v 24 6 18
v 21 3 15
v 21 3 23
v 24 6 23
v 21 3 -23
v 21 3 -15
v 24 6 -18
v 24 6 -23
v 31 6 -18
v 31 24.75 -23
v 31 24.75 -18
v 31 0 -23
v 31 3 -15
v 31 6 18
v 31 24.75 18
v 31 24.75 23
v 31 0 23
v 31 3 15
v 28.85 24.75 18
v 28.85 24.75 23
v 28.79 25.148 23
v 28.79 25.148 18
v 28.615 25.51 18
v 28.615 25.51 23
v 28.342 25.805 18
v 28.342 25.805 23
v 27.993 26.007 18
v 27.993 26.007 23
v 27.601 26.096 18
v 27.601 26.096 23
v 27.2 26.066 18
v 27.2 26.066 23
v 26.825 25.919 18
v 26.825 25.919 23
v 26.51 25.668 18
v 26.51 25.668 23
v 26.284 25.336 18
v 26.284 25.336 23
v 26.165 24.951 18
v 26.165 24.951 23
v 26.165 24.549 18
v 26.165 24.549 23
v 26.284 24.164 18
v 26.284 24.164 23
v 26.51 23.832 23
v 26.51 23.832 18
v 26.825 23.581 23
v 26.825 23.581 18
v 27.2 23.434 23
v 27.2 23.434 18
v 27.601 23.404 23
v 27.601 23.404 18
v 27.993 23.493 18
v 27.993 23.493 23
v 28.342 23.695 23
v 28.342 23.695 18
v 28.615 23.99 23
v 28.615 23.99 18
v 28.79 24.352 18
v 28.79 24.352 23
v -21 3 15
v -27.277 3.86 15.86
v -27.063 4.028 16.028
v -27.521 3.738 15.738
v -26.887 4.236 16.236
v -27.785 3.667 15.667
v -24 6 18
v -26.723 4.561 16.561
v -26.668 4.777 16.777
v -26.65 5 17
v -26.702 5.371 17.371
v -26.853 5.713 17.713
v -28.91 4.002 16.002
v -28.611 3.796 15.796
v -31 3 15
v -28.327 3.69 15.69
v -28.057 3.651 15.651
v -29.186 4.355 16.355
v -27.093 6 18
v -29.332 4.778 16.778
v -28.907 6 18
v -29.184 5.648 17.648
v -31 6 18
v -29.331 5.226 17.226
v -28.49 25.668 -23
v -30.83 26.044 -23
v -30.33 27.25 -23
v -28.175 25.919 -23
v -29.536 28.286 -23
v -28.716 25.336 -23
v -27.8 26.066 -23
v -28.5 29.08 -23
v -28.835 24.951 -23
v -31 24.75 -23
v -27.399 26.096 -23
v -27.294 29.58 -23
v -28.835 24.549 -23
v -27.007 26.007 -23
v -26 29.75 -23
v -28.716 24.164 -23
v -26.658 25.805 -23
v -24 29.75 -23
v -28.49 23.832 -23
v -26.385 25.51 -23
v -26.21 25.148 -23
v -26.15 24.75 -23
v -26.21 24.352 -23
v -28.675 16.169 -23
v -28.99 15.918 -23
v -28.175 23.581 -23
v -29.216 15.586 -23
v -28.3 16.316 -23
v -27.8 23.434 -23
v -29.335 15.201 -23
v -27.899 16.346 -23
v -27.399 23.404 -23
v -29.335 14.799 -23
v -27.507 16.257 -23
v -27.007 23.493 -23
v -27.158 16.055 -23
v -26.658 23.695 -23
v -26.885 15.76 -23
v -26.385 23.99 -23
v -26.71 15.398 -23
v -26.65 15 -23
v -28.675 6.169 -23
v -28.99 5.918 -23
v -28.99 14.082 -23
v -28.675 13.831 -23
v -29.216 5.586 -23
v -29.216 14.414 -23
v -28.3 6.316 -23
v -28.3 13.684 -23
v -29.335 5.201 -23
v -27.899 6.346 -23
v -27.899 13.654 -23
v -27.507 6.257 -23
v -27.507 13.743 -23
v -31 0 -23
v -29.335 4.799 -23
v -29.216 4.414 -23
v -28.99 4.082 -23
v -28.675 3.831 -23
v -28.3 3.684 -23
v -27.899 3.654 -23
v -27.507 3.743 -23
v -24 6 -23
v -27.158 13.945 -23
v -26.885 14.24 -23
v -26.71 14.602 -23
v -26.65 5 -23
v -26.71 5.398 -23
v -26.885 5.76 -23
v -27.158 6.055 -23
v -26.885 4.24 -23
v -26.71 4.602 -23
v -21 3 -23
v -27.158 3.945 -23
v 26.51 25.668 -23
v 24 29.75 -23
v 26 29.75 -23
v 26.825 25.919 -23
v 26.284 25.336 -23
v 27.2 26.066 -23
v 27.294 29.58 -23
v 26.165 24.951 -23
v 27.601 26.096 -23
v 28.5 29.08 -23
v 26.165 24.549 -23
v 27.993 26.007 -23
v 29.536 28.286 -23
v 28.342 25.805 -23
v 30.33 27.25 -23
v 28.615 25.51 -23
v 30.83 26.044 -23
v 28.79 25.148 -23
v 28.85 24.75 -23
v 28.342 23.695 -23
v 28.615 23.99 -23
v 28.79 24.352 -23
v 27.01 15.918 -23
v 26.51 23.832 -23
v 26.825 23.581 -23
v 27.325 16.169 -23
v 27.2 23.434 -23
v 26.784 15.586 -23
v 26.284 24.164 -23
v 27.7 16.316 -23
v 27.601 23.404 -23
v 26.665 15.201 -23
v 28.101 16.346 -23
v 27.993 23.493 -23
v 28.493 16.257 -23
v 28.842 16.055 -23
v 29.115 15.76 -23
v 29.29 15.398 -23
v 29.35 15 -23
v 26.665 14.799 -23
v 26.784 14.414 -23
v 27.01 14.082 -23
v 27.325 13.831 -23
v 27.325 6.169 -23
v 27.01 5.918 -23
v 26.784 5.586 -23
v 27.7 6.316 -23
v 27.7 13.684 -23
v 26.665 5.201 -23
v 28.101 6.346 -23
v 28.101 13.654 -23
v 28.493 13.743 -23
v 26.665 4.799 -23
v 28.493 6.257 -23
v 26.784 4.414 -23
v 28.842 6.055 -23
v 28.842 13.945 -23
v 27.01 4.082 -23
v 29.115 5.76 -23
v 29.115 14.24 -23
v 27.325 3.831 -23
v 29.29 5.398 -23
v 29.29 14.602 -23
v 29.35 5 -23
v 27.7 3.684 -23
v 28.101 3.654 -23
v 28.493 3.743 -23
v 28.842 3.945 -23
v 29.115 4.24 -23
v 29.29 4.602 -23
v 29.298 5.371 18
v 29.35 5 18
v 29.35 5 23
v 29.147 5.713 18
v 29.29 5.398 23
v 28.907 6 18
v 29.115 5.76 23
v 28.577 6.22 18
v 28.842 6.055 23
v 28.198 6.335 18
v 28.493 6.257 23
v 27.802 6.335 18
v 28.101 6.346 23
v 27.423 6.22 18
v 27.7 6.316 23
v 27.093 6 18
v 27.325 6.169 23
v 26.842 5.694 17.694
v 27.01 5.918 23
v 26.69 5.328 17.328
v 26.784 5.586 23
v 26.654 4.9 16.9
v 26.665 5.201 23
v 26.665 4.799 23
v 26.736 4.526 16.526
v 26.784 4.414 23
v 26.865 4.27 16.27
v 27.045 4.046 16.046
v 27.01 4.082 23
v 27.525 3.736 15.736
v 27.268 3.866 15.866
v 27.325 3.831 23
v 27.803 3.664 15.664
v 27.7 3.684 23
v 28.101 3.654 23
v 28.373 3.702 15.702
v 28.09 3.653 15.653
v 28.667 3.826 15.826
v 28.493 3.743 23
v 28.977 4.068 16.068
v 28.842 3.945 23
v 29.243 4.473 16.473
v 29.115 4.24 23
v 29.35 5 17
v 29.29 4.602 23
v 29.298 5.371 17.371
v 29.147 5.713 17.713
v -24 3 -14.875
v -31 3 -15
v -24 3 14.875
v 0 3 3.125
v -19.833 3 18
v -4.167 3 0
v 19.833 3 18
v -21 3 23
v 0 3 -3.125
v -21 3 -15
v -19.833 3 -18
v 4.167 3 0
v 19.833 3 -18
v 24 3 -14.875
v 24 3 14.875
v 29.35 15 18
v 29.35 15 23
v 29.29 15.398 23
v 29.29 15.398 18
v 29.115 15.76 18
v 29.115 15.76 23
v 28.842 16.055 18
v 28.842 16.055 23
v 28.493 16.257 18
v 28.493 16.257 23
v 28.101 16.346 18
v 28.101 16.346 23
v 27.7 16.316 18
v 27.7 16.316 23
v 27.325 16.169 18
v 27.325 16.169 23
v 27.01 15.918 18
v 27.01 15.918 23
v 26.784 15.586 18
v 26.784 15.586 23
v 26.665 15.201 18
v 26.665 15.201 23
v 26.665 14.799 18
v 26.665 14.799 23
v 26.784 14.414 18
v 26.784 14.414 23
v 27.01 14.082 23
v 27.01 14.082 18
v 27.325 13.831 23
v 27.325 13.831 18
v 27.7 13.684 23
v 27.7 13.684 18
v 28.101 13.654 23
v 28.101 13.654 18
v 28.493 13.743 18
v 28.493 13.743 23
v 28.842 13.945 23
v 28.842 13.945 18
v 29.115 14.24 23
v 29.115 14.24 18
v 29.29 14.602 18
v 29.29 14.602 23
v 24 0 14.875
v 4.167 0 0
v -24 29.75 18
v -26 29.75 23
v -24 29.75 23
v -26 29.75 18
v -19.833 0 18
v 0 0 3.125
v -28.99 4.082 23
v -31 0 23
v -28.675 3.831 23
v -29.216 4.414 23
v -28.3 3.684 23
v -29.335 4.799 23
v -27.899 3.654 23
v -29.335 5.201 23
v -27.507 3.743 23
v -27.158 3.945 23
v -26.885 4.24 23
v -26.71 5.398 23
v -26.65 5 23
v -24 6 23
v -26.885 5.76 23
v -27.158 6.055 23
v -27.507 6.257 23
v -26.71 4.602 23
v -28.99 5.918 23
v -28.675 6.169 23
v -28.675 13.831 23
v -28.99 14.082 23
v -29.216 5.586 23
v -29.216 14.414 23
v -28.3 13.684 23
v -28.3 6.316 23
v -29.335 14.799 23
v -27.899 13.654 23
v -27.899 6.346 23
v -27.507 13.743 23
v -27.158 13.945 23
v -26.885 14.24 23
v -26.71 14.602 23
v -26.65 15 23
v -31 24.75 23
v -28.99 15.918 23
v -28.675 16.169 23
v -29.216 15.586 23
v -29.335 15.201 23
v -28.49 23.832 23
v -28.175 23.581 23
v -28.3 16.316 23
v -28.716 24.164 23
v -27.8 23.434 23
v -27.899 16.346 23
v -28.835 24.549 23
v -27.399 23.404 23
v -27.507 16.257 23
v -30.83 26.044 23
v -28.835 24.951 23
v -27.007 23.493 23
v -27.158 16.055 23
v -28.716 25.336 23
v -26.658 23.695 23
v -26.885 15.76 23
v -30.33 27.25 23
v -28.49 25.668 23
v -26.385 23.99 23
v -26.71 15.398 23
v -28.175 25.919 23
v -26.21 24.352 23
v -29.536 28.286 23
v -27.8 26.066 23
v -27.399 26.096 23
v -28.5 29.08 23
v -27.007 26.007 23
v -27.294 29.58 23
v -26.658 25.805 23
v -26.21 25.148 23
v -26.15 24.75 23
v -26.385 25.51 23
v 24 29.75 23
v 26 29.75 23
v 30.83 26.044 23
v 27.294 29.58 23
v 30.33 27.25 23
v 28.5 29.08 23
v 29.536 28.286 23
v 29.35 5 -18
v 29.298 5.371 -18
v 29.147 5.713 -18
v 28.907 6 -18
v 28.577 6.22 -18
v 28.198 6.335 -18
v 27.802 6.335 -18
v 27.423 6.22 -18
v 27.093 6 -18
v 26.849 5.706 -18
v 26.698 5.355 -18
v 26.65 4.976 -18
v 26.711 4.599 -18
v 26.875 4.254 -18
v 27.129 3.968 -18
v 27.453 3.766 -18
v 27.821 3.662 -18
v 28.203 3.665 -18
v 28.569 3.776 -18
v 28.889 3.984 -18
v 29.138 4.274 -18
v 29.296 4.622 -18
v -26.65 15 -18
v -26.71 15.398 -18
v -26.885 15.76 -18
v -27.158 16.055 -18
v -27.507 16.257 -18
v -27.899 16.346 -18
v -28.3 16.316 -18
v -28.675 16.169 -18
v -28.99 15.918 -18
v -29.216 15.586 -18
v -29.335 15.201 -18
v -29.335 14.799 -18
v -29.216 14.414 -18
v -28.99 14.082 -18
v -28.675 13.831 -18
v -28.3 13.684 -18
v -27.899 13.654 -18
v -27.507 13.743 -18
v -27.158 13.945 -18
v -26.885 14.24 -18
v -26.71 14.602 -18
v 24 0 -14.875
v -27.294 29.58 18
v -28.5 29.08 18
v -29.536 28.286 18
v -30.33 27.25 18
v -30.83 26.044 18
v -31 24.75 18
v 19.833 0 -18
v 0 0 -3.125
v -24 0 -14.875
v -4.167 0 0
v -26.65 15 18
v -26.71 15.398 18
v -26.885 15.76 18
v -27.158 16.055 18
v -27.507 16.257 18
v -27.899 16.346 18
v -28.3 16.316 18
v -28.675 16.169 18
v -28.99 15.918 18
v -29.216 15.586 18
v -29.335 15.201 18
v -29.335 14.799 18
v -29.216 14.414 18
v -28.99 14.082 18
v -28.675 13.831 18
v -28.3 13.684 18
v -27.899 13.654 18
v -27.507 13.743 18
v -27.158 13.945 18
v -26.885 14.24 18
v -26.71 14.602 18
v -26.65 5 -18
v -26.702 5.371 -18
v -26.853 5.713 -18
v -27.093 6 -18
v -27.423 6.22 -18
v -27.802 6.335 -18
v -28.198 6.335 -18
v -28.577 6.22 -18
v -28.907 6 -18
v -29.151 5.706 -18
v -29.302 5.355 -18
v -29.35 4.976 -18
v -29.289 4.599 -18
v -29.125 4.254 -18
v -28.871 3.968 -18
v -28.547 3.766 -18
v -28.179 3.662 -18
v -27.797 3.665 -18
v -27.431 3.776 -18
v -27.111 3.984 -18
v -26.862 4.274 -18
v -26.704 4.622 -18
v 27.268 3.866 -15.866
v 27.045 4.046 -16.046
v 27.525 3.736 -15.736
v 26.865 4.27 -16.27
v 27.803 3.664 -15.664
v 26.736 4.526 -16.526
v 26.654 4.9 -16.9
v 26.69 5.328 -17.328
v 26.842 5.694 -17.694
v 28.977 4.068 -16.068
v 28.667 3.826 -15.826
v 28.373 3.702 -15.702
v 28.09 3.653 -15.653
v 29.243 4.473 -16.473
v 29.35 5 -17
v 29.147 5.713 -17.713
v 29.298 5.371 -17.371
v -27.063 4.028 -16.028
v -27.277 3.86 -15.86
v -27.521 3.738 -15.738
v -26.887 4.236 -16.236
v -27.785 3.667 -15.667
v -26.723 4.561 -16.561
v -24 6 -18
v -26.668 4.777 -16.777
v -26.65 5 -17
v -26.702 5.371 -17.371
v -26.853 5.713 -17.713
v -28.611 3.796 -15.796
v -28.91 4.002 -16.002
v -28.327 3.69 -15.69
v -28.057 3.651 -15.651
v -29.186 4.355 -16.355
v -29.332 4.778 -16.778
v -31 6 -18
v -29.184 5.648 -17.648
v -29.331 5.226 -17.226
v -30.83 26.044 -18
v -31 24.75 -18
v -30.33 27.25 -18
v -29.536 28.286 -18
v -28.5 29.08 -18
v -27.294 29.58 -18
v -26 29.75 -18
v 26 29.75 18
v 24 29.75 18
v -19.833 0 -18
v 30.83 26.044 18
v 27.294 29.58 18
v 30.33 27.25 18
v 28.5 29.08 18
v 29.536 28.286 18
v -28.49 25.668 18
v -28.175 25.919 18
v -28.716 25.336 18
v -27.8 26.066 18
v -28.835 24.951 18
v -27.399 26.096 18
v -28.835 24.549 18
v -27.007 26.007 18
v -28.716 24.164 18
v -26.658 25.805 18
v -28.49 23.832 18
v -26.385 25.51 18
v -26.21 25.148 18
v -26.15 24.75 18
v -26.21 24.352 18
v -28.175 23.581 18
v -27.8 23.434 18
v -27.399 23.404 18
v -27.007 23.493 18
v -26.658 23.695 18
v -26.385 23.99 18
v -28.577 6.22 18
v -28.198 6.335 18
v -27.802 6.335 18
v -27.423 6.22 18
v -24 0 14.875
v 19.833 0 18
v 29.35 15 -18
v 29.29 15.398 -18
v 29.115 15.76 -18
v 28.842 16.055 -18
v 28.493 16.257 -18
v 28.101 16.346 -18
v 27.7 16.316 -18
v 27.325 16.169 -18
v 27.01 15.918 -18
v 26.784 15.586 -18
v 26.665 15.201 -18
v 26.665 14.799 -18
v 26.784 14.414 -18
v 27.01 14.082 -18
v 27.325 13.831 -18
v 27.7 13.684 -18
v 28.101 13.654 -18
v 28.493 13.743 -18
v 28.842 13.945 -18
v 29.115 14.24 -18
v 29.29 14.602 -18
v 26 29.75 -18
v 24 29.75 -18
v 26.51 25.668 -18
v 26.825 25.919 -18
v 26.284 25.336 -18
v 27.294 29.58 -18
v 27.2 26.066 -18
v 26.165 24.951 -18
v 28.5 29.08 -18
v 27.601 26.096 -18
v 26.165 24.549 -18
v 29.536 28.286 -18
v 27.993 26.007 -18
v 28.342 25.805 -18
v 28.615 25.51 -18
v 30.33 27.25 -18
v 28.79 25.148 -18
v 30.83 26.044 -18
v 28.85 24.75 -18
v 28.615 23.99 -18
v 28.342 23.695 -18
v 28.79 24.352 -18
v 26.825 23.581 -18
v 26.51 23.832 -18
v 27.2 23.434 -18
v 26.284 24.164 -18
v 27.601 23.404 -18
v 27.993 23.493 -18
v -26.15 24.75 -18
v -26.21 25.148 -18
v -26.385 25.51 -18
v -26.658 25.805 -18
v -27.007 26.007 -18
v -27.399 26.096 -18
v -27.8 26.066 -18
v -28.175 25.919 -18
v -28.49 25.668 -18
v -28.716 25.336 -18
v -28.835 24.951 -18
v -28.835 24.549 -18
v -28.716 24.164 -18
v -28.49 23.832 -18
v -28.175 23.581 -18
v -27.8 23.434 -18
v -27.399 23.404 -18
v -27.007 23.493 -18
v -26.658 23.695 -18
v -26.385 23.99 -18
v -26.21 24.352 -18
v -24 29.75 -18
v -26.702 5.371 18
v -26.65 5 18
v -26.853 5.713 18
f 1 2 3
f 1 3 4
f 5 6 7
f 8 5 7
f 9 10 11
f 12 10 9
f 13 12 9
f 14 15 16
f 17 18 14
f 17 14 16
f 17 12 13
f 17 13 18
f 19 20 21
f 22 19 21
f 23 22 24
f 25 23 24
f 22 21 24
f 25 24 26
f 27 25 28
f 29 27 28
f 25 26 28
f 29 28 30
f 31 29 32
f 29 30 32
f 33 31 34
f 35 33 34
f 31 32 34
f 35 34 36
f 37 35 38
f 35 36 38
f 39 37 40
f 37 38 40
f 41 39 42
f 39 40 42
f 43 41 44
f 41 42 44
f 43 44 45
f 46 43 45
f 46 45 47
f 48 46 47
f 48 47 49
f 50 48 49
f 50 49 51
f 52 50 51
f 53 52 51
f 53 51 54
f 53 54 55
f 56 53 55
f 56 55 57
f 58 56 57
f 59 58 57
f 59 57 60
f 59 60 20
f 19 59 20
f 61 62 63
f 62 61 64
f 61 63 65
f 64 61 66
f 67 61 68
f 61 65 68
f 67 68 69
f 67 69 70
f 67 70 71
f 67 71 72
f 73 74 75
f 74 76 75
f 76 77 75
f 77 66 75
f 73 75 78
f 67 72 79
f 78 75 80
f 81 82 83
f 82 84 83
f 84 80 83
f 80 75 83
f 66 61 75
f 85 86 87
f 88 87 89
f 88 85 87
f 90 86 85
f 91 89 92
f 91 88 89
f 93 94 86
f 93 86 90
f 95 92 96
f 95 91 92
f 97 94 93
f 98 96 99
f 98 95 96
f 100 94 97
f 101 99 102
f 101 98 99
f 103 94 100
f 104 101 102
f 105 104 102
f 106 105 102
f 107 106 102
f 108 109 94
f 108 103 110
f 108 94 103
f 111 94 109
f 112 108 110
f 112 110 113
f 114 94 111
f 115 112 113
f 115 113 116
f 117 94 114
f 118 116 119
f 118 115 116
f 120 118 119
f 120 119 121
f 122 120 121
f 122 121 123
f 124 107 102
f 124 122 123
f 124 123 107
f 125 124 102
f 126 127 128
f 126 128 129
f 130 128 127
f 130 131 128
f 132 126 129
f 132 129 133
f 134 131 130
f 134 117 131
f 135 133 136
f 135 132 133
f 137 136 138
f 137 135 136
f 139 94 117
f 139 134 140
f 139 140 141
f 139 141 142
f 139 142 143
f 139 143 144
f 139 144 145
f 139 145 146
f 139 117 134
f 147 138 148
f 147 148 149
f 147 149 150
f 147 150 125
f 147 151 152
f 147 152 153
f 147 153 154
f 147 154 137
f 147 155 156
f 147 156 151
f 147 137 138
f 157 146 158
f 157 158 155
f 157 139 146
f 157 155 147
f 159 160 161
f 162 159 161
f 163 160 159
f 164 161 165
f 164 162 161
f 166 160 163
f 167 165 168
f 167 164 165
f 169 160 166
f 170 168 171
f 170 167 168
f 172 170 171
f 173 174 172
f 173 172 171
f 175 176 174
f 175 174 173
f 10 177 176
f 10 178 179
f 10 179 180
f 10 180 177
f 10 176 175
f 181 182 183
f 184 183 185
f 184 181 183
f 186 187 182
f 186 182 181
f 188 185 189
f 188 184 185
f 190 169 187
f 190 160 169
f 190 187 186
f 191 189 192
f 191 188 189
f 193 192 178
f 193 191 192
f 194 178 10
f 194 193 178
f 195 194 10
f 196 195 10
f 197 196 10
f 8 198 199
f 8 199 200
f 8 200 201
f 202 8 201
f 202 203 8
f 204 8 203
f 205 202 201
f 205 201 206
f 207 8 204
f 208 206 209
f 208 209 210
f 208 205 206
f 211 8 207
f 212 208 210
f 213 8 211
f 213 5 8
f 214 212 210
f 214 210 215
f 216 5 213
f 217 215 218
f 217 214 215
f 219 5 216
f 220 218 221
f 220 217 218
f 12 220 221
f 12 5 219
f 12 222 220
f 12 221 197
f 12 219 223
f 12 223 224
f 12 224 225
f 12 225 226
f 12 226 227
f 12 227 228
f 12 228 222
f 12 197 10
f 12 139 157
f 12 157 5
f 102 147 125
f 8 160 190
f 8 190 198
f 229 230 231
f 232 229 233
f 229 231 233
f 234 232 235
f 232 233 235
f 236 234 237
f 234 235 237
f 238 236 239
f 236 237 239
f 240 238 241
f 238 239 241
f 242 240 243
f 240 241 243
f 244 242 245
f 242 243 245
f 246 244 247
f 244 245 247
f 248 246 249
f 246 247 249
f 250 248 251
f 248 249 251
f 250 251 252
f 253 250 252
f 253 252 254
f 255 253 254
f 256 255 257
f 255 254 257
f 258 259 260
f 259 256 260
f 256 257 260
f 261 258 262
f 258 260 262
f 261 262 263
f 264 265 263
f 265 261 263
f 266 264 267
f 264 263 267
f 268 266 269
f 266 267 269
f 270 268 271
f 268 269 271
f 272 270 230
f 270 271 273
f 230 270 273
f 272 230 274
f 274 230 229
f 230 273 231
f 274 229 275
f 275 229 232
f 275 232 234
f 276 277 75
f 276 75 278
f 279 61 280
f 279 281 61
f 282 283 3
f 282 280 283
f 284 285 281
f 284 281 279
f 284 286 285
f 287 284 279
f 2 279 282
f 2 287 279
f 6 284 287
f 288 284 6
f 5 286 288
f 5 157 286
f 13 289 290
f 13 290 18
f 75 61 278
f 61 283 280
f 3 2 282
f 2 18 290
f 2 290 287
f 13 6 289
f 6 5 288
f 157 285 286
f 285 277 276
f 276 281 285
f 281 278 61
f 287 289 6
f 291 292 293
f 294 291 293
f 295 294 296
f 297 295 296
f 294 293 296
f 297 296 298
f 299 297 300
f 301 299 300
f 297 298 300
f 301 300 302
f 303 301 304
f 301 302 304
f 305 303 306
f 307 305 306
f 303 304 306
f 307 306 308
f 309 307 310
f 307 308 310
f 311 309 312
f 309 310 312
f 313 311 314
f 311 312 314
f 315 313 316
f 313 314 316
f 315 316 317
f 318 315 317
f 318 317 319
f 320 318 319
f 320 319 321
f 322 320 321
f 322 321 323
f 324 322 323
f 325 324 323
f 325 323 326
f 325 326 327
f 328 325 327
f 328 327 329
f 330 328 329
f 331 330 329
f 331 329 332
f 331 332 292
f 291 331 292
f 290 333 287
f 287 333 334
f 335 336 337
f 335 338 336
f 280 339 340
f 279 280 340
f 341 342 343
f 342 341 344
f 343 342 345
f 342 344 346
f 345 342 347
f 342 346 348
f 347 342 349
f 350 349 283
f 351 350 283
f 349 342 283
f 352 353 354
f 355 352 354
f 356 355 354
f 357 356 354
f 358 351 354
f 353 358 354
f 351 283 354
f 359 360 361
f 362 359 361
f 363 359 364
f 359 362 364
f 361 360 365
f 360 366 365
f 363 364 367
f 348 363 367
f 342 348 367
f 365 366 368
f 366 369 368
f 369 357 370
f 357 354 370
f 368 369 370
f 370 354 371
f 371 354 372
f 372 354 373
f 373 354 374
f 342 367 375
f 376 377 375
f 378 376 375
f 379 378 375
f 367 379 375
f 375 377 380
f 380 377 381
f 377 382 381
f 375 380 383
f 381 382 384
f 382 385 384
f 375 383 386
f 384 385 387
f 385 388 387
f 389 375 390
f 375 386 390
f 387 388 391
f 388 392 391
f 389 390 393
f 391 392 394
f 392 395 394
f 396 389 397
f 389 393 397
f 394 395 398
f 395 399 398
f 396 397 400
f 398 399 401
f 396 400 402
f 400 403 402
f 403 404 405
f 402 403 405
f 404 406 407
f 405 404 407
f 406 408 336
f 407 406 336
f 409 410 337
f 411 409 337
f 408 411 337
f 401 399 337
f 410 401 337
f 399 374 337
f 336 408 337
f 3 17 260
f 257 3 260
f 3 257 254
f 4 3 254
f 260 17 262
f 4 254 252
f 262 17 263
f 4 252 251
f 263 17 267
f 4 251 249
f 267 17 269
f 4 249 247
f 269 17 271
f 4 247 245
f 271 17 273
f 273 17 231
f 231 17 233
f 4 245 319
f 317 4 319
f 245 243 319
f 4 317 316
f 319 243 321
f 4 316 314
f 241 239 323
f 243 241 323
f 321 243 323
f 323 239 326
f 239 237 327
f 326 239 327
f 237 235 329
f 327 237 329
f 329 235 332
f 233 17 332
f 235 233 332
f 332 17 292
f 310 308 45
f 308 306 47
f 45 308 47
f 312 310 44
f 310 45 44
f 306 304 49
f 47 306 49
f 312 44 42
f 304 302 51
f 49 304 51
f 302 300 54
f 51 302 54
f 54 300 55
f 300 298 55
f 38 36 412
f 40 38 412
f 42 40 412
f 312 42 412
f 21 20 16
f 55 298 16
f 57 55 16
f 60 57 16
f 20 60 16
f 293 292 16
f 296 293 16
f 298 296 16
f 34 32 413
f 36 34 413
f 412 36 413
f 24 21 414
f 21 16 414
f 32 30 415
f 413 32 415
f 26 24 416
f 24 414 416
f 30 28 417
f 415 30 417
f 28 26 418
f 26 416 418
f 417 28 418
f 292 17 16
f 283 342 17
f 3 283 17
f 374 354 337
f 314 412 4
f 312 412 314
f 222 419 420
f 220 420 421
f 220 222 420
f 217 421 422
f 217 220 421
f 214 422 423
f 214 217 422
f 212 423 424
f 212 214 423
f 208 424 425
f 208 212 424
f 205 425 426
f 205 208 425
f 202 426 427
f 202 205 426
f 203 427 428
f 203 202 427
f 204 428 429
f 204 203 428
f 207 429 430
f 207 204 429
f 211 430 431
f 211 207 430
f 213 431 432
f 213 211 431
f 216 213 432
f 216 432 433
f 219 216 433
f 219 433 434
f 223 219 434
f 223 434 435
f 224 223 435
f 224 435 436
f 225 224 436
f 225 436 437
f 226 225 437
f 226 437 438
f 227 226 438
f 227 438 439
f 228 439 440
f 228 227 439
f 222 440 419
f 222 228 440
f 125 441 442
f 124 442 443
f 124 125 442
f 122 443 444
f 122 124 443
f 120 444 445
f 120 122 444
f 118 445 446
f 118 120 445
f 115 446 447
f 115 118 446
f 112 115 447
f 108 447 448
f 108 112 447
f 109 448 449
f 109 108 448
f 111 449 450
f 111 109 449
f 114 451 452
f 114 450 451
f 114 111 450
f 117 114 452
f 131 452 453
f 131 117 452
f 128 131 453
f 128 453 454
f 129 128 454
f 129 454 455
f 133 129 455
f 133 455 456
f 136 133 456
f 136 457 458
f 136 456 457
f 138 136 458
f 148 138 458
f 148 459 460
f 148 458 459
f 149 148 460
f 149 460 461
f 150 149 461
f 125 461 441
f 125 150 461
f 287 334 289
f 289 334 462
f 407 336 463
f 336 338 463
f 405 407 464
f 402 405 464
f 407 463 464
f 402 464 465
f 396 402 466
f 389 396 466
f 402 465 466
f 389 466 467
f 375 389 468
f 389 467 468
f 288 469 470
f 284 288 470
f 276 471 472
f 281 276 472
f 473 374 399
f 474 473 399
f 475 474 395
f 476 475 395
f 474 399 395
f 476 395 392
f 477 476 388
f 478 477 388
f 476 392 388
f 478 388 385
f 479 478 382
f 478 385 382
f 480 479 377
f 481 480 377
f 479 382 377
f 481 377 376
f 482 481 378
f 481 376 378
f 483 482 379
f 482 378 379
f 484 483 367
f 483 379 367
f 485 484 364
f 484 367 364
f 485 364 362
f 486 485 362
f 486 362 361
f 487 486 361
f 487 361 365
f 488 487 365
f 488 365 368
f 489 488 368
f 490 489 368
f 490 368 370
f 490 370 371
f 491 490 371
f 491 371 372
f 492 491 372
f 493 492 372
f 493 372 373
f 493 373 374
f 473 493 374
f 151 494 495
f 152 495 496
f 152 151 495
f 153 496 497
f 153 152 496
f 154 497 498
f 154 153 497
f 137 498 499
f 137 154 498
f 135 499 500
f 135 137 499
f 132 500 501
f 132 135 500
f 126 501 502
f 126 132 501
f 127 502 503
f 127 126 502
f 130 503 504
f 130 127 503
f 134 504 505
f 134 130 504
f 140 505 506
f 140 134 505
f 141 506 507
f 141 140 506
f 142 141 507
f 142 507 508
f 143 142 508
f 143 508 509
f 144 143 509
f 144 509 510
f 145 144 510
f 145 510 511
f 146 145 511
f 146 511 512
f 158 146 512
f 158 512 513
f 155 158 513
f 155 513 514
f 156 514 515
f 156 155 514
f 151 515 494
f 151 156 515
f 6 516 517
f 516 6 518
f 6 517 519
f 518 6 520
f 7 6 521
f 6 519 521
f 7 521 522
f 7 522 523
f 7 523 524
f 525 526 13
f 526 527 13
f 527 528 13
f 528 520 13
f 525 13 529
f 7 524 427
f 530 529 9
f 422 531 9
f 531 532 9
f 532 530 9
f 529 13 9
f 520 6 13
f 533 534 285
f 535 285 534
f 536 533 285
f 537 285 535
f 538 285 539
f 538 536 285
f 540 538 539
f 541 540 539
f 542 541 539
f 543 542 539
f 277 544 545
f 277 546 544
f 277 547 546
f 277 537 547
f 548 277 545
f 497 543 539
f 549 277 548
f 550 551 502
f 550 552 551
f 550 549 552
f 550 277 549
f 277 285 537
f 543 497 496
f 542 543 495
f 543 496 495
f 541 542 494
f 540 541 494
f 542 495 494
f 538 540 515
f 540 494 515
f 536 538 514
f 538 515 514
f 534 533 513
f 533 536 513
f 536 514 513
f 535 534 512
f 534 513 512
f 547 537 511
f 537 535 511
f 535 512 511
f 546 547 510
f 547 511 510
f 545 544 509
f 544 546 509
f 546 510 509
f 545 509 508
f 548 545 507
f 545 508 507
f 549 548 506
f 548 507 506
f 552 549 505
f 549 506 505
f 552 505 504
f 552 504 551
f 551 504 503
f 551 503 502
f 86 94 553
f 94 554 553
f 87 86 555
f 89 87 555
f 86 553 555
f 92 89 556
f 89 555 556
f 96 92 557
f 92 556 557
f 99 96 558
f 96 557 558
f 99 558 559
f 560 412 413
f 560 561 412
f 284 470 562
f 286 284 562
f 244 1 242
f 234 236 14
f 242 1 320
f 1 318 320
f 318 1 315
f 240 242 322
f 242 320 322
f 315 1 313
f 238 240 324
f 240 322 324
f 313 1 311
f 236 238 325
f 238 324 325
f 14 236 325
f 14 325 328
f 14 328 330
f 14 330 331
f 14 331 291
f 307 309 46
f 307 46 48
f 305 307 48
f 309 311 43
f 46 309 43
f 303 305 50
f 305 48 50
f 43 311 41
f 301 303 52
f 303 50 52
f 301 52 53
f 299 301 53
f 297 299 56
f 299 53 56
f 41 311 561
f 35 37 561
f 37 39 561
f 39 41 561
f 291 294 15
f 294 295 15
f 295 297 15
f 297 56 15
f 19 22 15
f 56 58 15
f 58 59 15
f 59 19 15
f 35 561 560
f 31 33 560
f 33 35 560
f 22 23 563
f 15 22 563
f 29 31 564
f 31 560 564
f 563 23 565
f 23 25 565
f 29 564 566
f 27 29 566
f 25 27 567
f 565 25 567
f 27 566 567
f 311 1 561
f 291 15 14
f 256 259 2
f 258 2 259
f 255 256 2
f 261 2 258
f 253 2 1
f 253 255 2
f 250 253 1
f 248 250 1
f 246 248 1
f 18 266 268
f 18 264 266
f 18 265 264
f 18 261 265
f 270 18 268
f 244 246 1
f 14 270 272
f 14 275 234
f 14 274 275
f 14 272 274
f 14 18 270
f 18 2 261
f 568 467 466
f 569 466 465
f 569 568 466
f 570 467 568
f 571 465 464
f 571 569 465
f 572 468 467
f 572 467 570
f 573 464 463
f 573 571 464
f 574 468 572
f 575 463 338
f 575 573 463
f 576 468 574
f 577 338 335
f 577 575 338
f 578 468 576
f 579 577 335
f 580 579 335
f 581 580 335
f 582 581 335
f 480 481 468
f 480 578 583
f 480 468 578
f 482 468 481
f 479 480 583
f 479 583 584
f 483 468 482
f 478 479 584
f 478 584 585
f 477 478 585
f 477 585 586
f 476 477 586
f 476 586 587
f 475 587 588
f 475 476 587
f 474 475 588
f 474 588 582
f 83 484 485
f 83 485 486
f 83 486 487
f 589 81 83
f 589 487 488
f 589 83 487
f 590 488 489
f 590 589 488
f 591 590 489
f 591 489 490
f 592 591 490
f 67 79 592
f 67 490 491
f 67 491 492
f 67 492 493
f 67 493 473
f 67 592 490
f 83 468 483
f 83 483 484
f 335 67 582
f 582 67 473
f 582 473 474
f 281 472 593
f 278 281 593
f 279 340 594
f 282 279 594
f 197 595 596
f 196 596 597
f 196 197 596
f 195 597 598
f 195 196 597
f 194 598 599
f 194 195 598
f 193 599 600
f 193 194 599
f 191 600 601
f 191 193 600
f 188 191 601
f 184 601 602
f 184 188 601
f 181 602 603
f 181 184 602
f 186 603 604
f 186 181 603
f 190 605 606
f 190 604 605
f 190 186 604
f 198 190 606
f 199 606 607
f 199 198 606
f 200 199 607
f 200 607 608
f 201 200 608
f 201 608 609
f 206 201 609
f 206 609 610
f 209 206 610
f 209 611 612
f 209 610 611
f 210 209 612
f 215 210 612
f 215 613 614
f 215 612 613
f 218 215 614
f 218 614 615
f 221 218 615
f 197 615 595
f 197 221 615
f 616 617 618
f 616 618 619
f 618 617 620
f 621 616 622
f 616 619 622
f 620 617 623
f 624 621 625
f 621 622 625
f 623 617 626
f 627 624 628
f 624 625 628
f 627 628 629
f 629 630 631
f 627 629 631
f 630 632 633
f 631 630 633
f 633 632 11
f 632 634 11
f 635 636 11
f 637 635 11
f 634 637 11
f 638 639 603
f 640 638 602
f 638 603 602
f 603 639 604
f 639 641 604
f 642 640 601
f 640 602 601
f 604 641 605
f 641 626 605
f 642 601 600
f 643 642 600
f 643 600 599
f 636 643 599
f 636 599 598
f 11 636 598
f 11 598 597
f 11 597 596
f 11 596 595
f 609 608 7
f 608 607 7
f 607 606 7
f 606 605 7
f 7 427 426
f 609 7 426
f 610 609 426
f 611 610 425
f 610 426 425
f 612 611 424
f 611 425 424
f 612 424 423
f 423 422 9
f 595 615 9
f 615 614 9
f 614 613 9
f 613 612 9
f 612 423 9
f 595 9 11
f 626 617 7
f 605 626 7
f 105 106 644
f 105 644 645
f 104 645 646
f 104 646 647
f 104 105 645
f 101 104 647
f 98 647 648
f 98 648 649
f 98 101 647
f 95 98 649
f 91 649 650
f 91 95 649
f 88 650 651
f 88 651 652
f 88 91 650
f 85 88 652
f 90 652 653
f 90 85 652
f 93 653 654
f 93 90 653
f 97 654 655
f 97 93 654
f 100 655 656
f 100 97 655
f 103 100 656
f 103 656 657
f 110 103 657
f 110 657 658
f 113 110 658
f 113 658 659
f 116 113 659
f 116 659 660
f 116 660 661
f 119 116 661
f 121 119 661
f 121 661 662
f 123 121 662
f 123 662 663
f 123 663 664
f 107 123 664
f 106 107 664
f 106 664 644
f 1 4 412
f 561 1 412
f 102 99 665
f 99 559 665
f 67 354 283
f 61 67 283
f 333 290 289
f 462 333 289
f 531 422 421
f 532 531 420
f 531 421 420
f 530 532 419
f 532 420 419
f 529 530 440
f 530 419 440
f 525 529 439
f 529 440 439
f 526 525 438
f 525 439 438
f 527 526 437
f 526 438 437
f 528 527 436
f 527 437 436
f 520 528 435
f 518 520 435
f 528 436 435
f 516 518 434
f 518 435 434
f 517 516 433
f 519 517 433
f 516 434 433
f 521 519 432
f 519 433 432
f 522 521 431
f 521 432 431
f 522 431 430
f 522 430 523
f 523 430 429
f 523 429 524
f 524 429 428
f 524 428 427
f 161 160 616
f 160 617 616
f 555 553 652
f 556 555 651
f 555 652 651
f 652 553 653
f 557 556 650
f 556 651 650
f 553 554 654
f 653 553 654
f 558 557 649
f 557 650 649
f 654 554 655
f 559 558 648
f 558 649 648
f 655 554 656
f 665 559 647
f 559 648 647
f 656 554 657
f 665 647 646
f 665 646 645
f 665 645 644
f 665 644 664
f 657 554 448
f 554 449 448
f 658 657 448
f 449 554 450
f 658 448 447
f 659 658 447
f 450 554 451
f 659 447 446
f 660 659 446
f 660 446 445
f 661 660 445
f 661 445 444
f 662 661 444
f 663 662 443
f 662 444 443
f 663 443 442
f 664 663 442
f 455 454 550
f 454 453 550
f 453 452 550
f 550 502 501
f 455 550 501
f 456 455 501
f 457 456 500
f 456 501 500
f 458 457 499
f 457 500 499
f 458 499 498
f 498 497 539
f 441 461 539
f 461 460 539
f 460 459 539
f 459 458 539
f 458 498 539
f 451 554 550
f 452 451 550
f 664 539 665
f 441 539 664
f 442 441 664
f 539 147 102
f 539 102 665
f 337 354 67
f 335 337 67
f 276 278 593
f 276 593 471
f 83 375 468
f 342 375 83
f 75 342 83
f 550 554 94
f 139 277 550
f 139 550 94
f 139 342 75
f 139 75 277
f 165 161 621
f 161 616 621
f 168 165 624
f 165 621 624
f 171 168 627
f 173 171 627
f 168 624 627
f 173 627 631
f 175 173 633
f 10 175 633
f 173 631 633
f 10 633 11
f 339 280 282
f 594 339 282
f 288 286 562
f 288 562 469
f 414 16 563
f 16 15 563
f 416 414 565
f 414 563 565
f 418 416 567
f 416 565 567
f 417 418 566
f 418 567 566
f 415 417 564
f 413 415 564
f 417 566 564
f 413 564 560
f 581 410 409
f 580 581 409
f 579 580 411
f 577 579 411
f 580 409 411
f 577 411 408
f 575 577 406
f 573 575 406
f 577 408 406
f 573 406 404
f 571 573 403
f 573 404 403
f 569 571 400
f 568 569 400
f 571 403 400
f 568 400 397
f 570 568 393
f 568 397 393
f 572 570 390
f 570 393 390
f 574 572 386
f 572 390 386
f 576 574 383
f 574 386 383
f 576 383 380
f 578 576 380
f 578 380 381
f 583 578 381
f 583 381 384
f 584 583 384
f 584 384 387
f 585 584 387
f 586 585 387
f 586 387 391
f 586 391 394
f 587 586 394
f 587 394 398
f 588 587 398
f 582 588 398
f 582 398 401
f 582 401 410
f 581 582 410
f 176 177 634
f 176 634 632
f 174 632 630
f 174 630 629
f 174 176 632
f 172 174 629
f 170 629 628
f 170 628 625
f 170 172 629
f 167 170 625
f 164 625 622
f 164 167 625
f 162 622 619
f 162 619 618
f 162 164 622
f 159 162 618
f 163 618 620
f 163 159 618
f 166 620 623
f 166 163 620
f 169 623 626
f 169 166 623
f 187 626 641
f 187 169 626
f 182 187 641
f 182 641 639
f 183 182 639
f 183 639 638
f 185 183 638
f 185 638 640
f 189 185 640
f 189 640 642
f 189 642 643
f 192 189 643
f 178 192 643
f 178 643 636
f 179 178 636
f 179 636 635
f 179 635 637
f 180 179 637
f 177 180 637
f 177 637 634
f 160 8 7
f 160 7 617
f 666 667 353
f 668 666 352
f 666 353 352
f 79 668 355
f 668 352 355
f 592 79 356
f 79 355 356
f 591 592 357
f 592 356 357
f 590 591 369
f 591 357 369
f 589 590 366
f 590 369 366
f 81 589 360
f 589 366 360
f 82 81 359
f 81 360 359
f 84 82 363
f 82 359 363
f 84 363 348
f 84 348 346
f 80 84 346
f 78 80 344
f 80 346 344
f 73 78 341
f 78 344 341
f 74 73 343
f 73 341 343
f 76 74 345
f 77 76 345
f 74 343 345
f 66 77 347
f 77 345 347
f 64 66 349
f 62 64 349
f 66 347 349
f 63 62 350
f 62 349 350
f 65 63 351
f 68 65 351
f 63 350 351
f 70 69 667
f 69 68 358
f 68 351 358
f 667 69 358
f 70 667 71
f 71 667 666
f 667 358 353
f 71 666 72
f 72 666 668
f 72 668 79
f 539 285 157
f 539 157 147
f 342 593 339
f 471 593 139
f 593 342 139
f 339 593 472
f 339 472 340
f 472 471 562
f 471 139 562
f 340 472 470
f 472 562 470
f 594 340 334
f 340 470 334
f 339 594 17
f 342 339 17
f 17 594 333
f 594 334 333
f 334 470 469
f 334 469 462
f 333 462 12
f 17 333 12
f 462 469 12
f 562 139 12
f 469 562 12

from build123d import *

# Parameters (mm, degrees)
SKETCH_1_W          = 62
SKETCH_1_H          = 46
EXTRUDE_1_DEPTH     = 3
SKETCH_2_W          = 7
SKETCH_2_H          = 17
EXTRUDE_2_DEPTH     = 5
SKETCH_3_R          = 1.35
CUT_EXTRUDE_1_DEPTH = 12
SKETCH_7_W          = 7
SKETCH_7_H          = 5
EXTRUDE_4_DEPTH     = 9.75
CUT_EXTRUDE_4_REACH = 64.945
SKETCH_8_R          = 1.35
CUT_EXTRUDE_3_REACH = 50.735
SKETCH_5_W          = 48
SKETCH_5_H          = 36
EXTRUDE_3_DEPTH     = 3
CHAMFER_4_SIZE      = 3
FILLET_1_R          = 5


with BuildPart() as part:
    # 草图1 → 凸台-拉伸1 (new body)
    with BuildSketch(Plane(origin=(0, 0, 0), x_dir=(1, 0, 0), z_dir=(0, 1, 0))):
        Rectangle(SKETCH_1_W, SKETCH_1_H)
    extrude(amount=EXTRUDE_1_DEPTH)

    # 草图2 → 凸台-拉伸2 (add)
    with BuildSketch(Plane.XY.offset(23)):
        with Locations((-27.5, 11.5)):
            Rectangle(SKETCH_2_W, SKETCH_2_H)
        with Locations((27.5, 11.5)):
            Rectangle(SKETCH_2_W, SKETCH_2_H)
    extrude_2 = extrude(amount=-EXTRUDE_2_DEPTH)

    # 草图3 → 切除-拉伸1 (cut)
    with BuildSketch(Plane.XY.offset(23)):
        with Locations((-28, 15)):
            Circle(SKETCH_3_R)
        with Locations((-28, 5)):
            Circle(SKETCH_3_R)
        with Locations((28, 5)):
            Circle(SKETCH_3_R)
        with Locations((28, 15)):
            Circle(SKETCH_3_R)
    cut_extrude_1 = extrude(amount=-CUT_EXTRUDE_1_DEPTH, mode=Mode.SUBTRACT)

    # 草图7 → 凸台-拉伸4 (add)
    with BuildSketch(Plane(origin=(0, 20, 0), x_dir=(1, 0, 0), z_dir=(0, 1, 0))):
        with Locations((-27.5, -20.5)):
            Rectangle(SKETCH_7_W, SKETCH_7_H)
        with Locations((27.5, -20.5)):
            Rectangle(SKETCH_7_W, SKETCH_7_H)
    extrude_4 = extrude(amount=EXTRUDE_4_DEPTH)

    # 草图8 → 切除-拉伸4 (cut, up to next)
    with BuildSketch(Plane.XY.offset(23), mode=Mode.PRIVATE) as cut_extrude_4_sk1:
        with Locations((-27.5, 24.75)):
            Circle(SKETCH_8_R)
    cut_extrude_4_tool1 = extrude(cut_extrude_4_sk1.sketch, amount=-CUT_EXTRUDE_4_REACH, mode=Mode.PRIVATE) & part.part
    # 草图8 → 切除-拉伸4 (cut, up to next)
    with BuildSketch(Plane.XY.offset(23), mode=Mode.PRIVATE) as cut_extrude_4_sk2:
        with Locations((27.5, 24.75)):
            Circle(SKETCH_8_R)
    cut_extrude_4_tool2 = extrude(cut_extrude_4_sk2.sketch, amount=-CUT_EXTRUDE_4_REACH, mode=Mode.PRIVATE) & part.part
    cut_extrude_4_1 = cut_extrude_4_tool1.solids().sort_by_distance((-27.5, 24.75, 23))[0]
    add(cut_extrude_4_1, mode=Mode.SUBTRACT)
    cut_extrude_4_2 = cut_extrude_4_tool2.solids().sort_by_distance((27.5, 24.75, 23))[0]
    add(cut_extrude_4_2, mode=Mode.SUBTRACT)
    cut_extrude_4 = cut_extrude_4_1 + cut_extrude_4_2  # 切除-拉伸4 as one shape, for the pattern or mirror that repeats it

    # 镜向1: 凸台-拉伸2, 切除-拉伸1, 凸台-拉伸4, 切除-拉伸4 across plane
    add(extrude_2.mirror(Plane.XY))
    add(cut_extrude_1.mirror(Plane.XY), mode=Mode.SUBTRACT)
    add(extrude_4.mirror(Plane.XY))
    add(cut_extrude_4.mirror(Plane.XY), mode=Mode.SUBTRACT)

    # 草图5 → 切除-拉伸3 (cut, up to next)
    with BuildSketch(Plane(origin=(0, 29.75, 0), x_dir=(1, 0, 0), z_dir=(0, 1, 0)), mode=Mode.PRIVATE) as cut_extrude_3_sk1:
        Rectangle(SKETCH_5_W, SKETCH_5_H)
    cut_extrude_3_tool1 = extrude(cut_extrude_3_sk1.sketch, amount=-CUT_EXTRUDE_3_REACH, mode=Mode.PRIVATE) & part.part
    add(cut_extrude_3_tool1.solids().sort_by_distance((0, 29.75, 0))[0], mode=Mode.SUBTRACT)

    # 草图6 → 凸台-拉伸3 (add)
    with BuildSketch(Plane(origin=(0, 0, 0), x_dir=(1, 0, 0), z_dir=(0, 1, 0))):
        Polygon((-25.5, 16), (-4.166666667, 0), (0, 3.125), (-22.5, 20), align=None)
        Polygon((0, 3.125), (4.166666667, 0), (25.5, 16), (22.5, 20), align=None)
        Polygon((-4.166666667, 0), (0, -3.125), (4.166666667, 0), (0, 3.125), align=None)
        Polygon((-22.5, -20), (0, -3.125), (-4.166666667, 0), (-25.5, -16), align=None)
        Polygon((0, -3.125), (22.5, -20), (25.5, -16), (4.166666667, 0), align=None)
    extrude(amount=EXTRUDE_3_DEPTH)

    # 倒角4
    # the kernel refuses this chamfer: 3 mm, written as the material it adds along each edge
    with BuildSketch(Plane(origin=(24, 3, -23), x_dir=(-0.9996219169112968, -0.027495876610586046, 0), z_dir=(0, 0, 1))) as chamfer_4_piece_1:
        Polygon((CHAMFER_4_SIZE * 0.999621916911, -CHAMFER_4_SIZE * 0.0274958766106), (-CHAMFER_4_SIZE * 0.0274958766106, -CHAMFER_4_SIZE * 0.999621916911), (0, 0), align=None)
    extrude(amount=5)
    with BuildSketch(Plane(origin=(31, 3, -18), x_dir=(0, -0.02749587661058635, 0.9996219169112968), z_dir=(-1, 0, 0))) as chamfer_4_piece_2_section:
        Polygon((CHAMFER_4_SIZE * 0.999621916911, CHAMFER_4_SIZE * 0.0274958766106), (-CHAMFER_4_SIZE * 0.0274958766106, CHAMFER_4_SIZE * 0.999621916911), (0, 0), align=None)
    chamfer_4_piece_2 = extrude(amount=7, mode=Mode.PRIVATE)
    chamfer_4_piece_2 = chamfer_4_piece_2 - Plane(origin=(28, 5, -15.465016305), x_dir=(1, 0, 0), z_dir=(0, 0, -1)) * Cylinder(1.35, 26, mode=Mode.PRIVATE)
    add(chamfer_4_piece_2)
    with BuildSketch(Plane(origin=(-31, 3, 18), x_dir=(0, -0.02749587661058635, -0.9996219169112968), z_dir=(1, 0, 0))) as chamfer_4_piece_3_section:
        Polygon((CHAMFER_4_SIZE * 0.999621916911, CHAMFER_4_SIZE * 0.0274958766106), (-CHAMFER_4_SIZE * 0.0274958766106, CHAMFER_4_SIZE * 0.999621916911), (0, 0), align=None)
    chamfer_4_piece_3 = extrude(amount=7, mode=Mode.PRIVATE)
    chamfer_4_piece_3 = chamfer_4_piece_3 - Plane(origin=(-28, 5, 15.465016305), x_dir=(1, 0, 0), z_dir=(0, 0, 1)) * Cylinder(1.35, 26, mode=Mode.PRIVATE)
    add(chamfer_4_piece_3)
    with BuildSketch(Plane(origin=(-24, 3, 23), x_dir=(-0.027495876610586775, 0.9996219169112968, 0), z_dir=(0, 0, -1)), Plane(origin=(24, 3, 23), x_dir=(-0.9996219169112968, -0.027495876610586046, 0), z_dir=(0, 0, -1)), Plane(origin=(-24, 3, -23), x_dir=(0.9996219169112968, -0.027495876610586334, 0), z_dir=(0, 0, 1))) as chamfer_4_piece_4:
        Polygon((CHAMFER_4_SIZE * 0.999621916911, CHAMFER_4_SIZE * 0.0274958766106), (-CHAMFER_4_SIZE * 0.0274958766106, CHAMFER_4_SIZE * 0.999621916911), (0, 0), align=None)
    extrude(amount=5)
    with BuildSketch(Plane(origin=(31, 3, 18), x_dir=(0, -0.02749587661058635, -0.9996219169112968), z_dir=(-1, 0, 0))) as chamfer_4_piece_5_section:
        Polygon((CHAMFER_4_SIZE * 0.999621916911, -CHAMFER_4_SIZE * 0.0274958766106), (-CHAMFER_4_SIZE * 0.0274958766106, -CHAMFER_4_SIZE * 0.999621916911), (0, 0), align=None)
    chamfer_4_piece_5 = extrude(amount=7, mode=Mode.PRIVATE)
    chamfer_4_piece_5 = chamfer_4_piece_5 - Plane(origin=(28, 5, 15.465016305), x_dir=(1, 0, 0), z_dir=(0, 0, 1)) * Cylinder(1.35, 26, mode=Mode.PRIVATE)
    add(chamfer_4_piece_5)
    with BuildSketch(Plane(origin=(-31, 3, -18), x_dir=(0, -0.02749587661058635, 0.9996219169112968), z_dir=(1, 0, 0))) as chamfer_4_piece_6_section:
        Polygon((CHAMFER_4_SIZE * 0.999621916911, -CHAMFER_4_SIZE * 0.0274958766106), (-CHAMFER_4_SIZE * 0.0274958766106, -CHAMFER_4_SIZE * 0.999621916911), (0, 0), align=None)
    chamfer_4_piece_6 = extrude(amount=7, mode=Mode.PRIVATE)
    chamfer_4_piece_6 = chamfer_4_piece_6 - Plane(origin=(-28, 5, -15.465016305), x_dir=(1, 0, 0), z_dir=(0, 0, -1)) * Cylinder(1.35, 26, mode=Mode.PRIVATE)
    add(chamfer_4_piece_6)
    with BuildSketch(Plane(origin=(31, 3, -18), x_dir=(0, -0.02749587661058635, 0.9996219169112968), z_dir=(-1, 0, 0))) as chamfer_4_piece_7a_section:
        Polygon((CHAMFER_4_SIZE * 0.999621916911, CHAMFER_4_SIZE * 0.0274958766106), (-CHAMFER_4_SIZE * 0.0274958766106, CHAMFER_4_SIZE * 0.999621916911), (0, 0), align=None)
    chamfer_4_piece_7a = extrude(amount=14.715048964, mode=Mode.PRIVATE)
    chamfer_4_piece_7a = split(chamfer_4_piece_7a, bisect_by=Plane(origin=(20.147093464, 3.915896715, -18.235320098), z_dir=(0.5999999999999999, 0, 0.8000000000000002)), keep=Keep.TOP, mode=Mode.PRIVATE)
    chamfer_4_piece_7a = split(chamfer_4_piece_7a, bisect_by=Plane(origin=(24, 3.915896715, -16.873190305), z_dir=(-1, 0, 0)), keep=Keep.TOP, mode=Mode.PRIVATE)
    with BuildSketch(Plane(origin=(24, 3, -23), x_dir=(-0.9996219169112968, -0.027495876610586046, 0), z_dir=(0, 0, 1))) as chamfer_4_piece_7b_section:
        Polygon((CHAMFER_4_SIZE * 0.999621916911, -CHAMFER_4_SIZE * 0.0274958766106), (-CHAMFER_4_SIZE * 0.0274958766106, -CHAMFER_4_SIZE * 0.999621916911), (0, 0), align=None)
    chamfer_4_piece_7b = extrude(amount=12.715048964, mode=Mode.PRIVATE)
    chamfer_4_piece_7b = split(chamfer_4_piece_7b, bisect_by=Plane(origin=(23.847814651, 3.930122584, -14.760860988), z_dir=(-0.6000000000000001, 0, -0.8)), keep=Keep.TOP, mode=Mode.PRIVATE)
    chamfer_4_piece_7b = split(chamfer_4_piece_7b, bisect_by=Plane(origin=(22.899773965, 3.930122584, -18), z_dir=(0, 0, 1)), keep=Keep.TOP, mode=Mode.PRIVATE)
    chamfer_4_piece_7 = chamfer_4_piece_7a & chamfer_4_piece_7b
    add(chamfer_4_piece_7)
    with BuildSketch(Plane(origin=(-24, 3, 23), x_dir=(-0.027495876610586775, 0.9996219169112968, 0), z_dir=(0, 0, -1))) as chamfer_4_piece_8a_section:
        Polygon((CHAMFER_4_SIZE * 0.999621916911, CHAMFER_4_SIZE * 0.0274958766106), (-CHAMFER_4_SIZE * 0.0274958766106, CHAMFER_4_SIZE * 0.999621916911), (0, 0), align=None)
    chamfer_4_piece_8a = extrude(amount=12.715048964, mode=Mode.PRIVATE)
    chamfer_4_piece_8a = split(chamfer_4_piece_8a, bisect_by=Plane(origin=(-22.899773965, 3.930122584, 18), z_dir=(0, 0, -1)), keep=Keep.TOP, mode=Mode.PRIVATE)
    chamfer_4_piece_8a = split(chamfer_4_piece_8a, bisect_by=Plane(origin=(-23.847814651, 3.930122584, 14.760860988), z_dir=(0.5999999999999998, 0, 0.8000000000000003)), keep=Keep.TOP, mode=Mode.PRIVATE)
    with BuildSketch(Plane(origin=(-31, 3, 18), x_dir=(0, -0.02749587661058635, -0.9996219169112968), z_dir=(1, 0, 0))) as chamfer_4_piece_8b_section:
        Polygon((CHAMFER_4_SIZE * 0.999621916911, CHAMFER_4_SIZE * 0.0274958766106), (-CHAMFER_4_SIZE * 0.0274958766106, CHAMFER_4_SIZE * 0.999621916911), (0, 0), align=None)
    chamfer_4_piece_8b = extrude(amount=14.715048964, mode=Mode.PRIVATE)
    chamfer_4_piece_8b = split(chamfer_4_piece_8b, bisect_by=Plane(origin=(-24, 3.915896715, 16.873190305), z_dir=(1, 0, 0)), keep=Keep.TOP, mode=Mode.PRIVATE)
    chamfer_4_piece_8b = split(chamfer_4_piece_8b, bisect_by=Plane(origin=(-20.147093464, 3.915896715, 18.235320098), z_dir=(-0.6000000000000001, 0, -0.8)), keep=Keep.TOP, mode=Mode.PRIVATE)
    chamfer_4_piece_8 = chamfer_4_piece_8a & chamfer_4_piece_8b
    add(chamfer_4_piece_8)
    with BuildSketch(Plane(origin=(24, 3, 23), x_dir=(-0.9996219169112968, -0.027495876610586046, 0), z_dir=(0, 0, -1))) as chamfer_4_piece_9a_section:
        Polygon((CHAMFER_4_SIZE * 0.999621916911, CHAMFER_4_SIZE * 0.0274958766106), (-CHAMFER_4_SIZE * 0.0274958766106, CHAMFER_4_SIZE * 0.999621916911), (0, 0), align=None)
    chamfer_4_piece_9a = extrude(amount=12.715048964, mode=Mode.PRIVATE)
    chamfer_4_piece_9a = split(chamfer_4_piece_9a, bisect_by=Plane(origin=(23.847814651, 3.930122584, 14.760860988), z_dir=(-0.6000000000000004, 0, 0.7999999999999997)), keep=Keep.TOP, mode=Mode.PRIVATE)
    chamfer_4_piece_9a = split(chamfer_4_piece_9a, bisect_by=Plane(origin=(22.899773965, 3.930122584, 18), z_dir=(0, 0, -1)), keep=Keep.TOP, mode=Mode.PRIVATE)
    with BuildSketch(Plane(origin=(31, 3, 18), x_dir=(0, -0.02749587661058635, -0.9996219169112968), z_dir=(-1, 0, 0))) as chamfer_4_piece_9b_section:
        Polygon((CHAMFER_4_SIZE * 0.999621916911, -CHAMFER_4_SIZE * 0.0274958766106), (-CHAMFER_4_SIZE * 0.0274958766106, -CHAMFER_4_SIZE * 0.999621916911), (0, 0), align=None)
    chamfer_4_piece_9b = extrude(amount=14.715048964, mode=Mode.PRIVATE)
    chamfer_4_piece_9b = split(chamfer_4_piece_9b, bisect_by=Plane(origin=(20.147093464, 3.915896715, 18.235320098), z_dir=(0.6000000000000003, 0, -0.7999999999999998)), keep=Keep.TOP, mode=Mode.PRIVATE)
    chamfer_4_piece_9b = split(chamfer_4_piece_9b, bisect_by=Plane(origin=(24, 3.915896715, 16.873190305), z_dir=(-1, 0, 0)), keep=Keep.TOP, mode=Mode.PRIVATE)
    chamfer_4_piece_9 = chamfer_4_piece_9a & chamfer_4_piece_9b
    add(chamfer_4_piece_9)
    with BuildSketch(Plane(origin=(-24, 3, -23), x_dir=(0.9996219169112968, -0.027495876610586334, 0), z_dir=(0, 0, 1))) as chamfer_4_piece_10a_section:
        Polygon((CHAMFER_4_SIZE * 0.999621916911, CHAMFER_4_SIZE * 0.0274958766106), (-CHAMFER_4_SIZE * 0.0274958766106, CHAMFER_4_SIZE * 0.999621916911), (0, 0), align=None)
    chamfer_4_piece_10a = extrude(amount=12.715048964, mode=Mode.PRIVATE)
    chamfer_4_piece_10a = split(chamfer_4_piece_10a, bisect_by=Plane(origin=(-23.847814651, 3.930122584, -14.760860988), z_dir=(0.6000000000000004, 0, -0.7999999999999999)), keep=Keep.TOP, mode=Mode.PRIVATE)
    chamfer_4_piece_10a = split(chamfer_4_piece_10a, bisect_by=Plane(origin=(-22.899773965, 3.930122584, -18), z_dir=(0, 0, 1)), keep=Keep.TOP, mode=Mode.PRIVATE)
    with BuildSketch(Plane(origin=(-31, 3, -18), x_dir=(0, -0.02749587661058635, 0.9996219169112968), z_dir=(1, 0, 0))) as chamfer_4_piece_10b_section:
        Polygon((CHAMFER_4_SIZE * 0.999621916911, -CHAMFER_4_SIZE * 0.0274958766106), (-CHAMFER_4_SIZE * 0.0274958766106, -CHAMFER_4_SIZE * 0.999621916911), (0, 0), align=None)
    chamfer_4_piece_10b = extrude(amount=14.715048964, mode=Mode.PRIVATE)
    chamfer_4_piece_10b = split(chamfer_4_piece_10b, bisect_by=Plane(origin=(-20.147093464, 3.915896715, -18.235320098), z_dir=(-0.6000000000000005, 0, 0.7999999999999997)), keep=Keep.TOP, mode=Mode.PRIVATE)
    chamfer_4_piece_10b = split(chamfer_4_piece_10b, bisect_by=Plane(origin=(-24, 3.915896715, -16.873190305), z_dir=(1, 0, 0)), keep=Keep.TOP, mode=Mode.PRIVATE)
    chamfer_4_piece_10 = chamfer_4_piece_10a & chamfer_4_piece_10b
    add(chamfer_4_piece_10)

    # 圆角1
    fillet_1_edges = [part.edges().sort_by_distance(p)[0] for p in [
        (-31, 29.75, -20.5),
        (31, 29.75, -20.5),
        (-31, 29.75, 20.5),
        (31, 29.75, 20.5),
    ]]
    fillet(fillet_1_edges, radius=FILLET_1_R)


solid = part.part
